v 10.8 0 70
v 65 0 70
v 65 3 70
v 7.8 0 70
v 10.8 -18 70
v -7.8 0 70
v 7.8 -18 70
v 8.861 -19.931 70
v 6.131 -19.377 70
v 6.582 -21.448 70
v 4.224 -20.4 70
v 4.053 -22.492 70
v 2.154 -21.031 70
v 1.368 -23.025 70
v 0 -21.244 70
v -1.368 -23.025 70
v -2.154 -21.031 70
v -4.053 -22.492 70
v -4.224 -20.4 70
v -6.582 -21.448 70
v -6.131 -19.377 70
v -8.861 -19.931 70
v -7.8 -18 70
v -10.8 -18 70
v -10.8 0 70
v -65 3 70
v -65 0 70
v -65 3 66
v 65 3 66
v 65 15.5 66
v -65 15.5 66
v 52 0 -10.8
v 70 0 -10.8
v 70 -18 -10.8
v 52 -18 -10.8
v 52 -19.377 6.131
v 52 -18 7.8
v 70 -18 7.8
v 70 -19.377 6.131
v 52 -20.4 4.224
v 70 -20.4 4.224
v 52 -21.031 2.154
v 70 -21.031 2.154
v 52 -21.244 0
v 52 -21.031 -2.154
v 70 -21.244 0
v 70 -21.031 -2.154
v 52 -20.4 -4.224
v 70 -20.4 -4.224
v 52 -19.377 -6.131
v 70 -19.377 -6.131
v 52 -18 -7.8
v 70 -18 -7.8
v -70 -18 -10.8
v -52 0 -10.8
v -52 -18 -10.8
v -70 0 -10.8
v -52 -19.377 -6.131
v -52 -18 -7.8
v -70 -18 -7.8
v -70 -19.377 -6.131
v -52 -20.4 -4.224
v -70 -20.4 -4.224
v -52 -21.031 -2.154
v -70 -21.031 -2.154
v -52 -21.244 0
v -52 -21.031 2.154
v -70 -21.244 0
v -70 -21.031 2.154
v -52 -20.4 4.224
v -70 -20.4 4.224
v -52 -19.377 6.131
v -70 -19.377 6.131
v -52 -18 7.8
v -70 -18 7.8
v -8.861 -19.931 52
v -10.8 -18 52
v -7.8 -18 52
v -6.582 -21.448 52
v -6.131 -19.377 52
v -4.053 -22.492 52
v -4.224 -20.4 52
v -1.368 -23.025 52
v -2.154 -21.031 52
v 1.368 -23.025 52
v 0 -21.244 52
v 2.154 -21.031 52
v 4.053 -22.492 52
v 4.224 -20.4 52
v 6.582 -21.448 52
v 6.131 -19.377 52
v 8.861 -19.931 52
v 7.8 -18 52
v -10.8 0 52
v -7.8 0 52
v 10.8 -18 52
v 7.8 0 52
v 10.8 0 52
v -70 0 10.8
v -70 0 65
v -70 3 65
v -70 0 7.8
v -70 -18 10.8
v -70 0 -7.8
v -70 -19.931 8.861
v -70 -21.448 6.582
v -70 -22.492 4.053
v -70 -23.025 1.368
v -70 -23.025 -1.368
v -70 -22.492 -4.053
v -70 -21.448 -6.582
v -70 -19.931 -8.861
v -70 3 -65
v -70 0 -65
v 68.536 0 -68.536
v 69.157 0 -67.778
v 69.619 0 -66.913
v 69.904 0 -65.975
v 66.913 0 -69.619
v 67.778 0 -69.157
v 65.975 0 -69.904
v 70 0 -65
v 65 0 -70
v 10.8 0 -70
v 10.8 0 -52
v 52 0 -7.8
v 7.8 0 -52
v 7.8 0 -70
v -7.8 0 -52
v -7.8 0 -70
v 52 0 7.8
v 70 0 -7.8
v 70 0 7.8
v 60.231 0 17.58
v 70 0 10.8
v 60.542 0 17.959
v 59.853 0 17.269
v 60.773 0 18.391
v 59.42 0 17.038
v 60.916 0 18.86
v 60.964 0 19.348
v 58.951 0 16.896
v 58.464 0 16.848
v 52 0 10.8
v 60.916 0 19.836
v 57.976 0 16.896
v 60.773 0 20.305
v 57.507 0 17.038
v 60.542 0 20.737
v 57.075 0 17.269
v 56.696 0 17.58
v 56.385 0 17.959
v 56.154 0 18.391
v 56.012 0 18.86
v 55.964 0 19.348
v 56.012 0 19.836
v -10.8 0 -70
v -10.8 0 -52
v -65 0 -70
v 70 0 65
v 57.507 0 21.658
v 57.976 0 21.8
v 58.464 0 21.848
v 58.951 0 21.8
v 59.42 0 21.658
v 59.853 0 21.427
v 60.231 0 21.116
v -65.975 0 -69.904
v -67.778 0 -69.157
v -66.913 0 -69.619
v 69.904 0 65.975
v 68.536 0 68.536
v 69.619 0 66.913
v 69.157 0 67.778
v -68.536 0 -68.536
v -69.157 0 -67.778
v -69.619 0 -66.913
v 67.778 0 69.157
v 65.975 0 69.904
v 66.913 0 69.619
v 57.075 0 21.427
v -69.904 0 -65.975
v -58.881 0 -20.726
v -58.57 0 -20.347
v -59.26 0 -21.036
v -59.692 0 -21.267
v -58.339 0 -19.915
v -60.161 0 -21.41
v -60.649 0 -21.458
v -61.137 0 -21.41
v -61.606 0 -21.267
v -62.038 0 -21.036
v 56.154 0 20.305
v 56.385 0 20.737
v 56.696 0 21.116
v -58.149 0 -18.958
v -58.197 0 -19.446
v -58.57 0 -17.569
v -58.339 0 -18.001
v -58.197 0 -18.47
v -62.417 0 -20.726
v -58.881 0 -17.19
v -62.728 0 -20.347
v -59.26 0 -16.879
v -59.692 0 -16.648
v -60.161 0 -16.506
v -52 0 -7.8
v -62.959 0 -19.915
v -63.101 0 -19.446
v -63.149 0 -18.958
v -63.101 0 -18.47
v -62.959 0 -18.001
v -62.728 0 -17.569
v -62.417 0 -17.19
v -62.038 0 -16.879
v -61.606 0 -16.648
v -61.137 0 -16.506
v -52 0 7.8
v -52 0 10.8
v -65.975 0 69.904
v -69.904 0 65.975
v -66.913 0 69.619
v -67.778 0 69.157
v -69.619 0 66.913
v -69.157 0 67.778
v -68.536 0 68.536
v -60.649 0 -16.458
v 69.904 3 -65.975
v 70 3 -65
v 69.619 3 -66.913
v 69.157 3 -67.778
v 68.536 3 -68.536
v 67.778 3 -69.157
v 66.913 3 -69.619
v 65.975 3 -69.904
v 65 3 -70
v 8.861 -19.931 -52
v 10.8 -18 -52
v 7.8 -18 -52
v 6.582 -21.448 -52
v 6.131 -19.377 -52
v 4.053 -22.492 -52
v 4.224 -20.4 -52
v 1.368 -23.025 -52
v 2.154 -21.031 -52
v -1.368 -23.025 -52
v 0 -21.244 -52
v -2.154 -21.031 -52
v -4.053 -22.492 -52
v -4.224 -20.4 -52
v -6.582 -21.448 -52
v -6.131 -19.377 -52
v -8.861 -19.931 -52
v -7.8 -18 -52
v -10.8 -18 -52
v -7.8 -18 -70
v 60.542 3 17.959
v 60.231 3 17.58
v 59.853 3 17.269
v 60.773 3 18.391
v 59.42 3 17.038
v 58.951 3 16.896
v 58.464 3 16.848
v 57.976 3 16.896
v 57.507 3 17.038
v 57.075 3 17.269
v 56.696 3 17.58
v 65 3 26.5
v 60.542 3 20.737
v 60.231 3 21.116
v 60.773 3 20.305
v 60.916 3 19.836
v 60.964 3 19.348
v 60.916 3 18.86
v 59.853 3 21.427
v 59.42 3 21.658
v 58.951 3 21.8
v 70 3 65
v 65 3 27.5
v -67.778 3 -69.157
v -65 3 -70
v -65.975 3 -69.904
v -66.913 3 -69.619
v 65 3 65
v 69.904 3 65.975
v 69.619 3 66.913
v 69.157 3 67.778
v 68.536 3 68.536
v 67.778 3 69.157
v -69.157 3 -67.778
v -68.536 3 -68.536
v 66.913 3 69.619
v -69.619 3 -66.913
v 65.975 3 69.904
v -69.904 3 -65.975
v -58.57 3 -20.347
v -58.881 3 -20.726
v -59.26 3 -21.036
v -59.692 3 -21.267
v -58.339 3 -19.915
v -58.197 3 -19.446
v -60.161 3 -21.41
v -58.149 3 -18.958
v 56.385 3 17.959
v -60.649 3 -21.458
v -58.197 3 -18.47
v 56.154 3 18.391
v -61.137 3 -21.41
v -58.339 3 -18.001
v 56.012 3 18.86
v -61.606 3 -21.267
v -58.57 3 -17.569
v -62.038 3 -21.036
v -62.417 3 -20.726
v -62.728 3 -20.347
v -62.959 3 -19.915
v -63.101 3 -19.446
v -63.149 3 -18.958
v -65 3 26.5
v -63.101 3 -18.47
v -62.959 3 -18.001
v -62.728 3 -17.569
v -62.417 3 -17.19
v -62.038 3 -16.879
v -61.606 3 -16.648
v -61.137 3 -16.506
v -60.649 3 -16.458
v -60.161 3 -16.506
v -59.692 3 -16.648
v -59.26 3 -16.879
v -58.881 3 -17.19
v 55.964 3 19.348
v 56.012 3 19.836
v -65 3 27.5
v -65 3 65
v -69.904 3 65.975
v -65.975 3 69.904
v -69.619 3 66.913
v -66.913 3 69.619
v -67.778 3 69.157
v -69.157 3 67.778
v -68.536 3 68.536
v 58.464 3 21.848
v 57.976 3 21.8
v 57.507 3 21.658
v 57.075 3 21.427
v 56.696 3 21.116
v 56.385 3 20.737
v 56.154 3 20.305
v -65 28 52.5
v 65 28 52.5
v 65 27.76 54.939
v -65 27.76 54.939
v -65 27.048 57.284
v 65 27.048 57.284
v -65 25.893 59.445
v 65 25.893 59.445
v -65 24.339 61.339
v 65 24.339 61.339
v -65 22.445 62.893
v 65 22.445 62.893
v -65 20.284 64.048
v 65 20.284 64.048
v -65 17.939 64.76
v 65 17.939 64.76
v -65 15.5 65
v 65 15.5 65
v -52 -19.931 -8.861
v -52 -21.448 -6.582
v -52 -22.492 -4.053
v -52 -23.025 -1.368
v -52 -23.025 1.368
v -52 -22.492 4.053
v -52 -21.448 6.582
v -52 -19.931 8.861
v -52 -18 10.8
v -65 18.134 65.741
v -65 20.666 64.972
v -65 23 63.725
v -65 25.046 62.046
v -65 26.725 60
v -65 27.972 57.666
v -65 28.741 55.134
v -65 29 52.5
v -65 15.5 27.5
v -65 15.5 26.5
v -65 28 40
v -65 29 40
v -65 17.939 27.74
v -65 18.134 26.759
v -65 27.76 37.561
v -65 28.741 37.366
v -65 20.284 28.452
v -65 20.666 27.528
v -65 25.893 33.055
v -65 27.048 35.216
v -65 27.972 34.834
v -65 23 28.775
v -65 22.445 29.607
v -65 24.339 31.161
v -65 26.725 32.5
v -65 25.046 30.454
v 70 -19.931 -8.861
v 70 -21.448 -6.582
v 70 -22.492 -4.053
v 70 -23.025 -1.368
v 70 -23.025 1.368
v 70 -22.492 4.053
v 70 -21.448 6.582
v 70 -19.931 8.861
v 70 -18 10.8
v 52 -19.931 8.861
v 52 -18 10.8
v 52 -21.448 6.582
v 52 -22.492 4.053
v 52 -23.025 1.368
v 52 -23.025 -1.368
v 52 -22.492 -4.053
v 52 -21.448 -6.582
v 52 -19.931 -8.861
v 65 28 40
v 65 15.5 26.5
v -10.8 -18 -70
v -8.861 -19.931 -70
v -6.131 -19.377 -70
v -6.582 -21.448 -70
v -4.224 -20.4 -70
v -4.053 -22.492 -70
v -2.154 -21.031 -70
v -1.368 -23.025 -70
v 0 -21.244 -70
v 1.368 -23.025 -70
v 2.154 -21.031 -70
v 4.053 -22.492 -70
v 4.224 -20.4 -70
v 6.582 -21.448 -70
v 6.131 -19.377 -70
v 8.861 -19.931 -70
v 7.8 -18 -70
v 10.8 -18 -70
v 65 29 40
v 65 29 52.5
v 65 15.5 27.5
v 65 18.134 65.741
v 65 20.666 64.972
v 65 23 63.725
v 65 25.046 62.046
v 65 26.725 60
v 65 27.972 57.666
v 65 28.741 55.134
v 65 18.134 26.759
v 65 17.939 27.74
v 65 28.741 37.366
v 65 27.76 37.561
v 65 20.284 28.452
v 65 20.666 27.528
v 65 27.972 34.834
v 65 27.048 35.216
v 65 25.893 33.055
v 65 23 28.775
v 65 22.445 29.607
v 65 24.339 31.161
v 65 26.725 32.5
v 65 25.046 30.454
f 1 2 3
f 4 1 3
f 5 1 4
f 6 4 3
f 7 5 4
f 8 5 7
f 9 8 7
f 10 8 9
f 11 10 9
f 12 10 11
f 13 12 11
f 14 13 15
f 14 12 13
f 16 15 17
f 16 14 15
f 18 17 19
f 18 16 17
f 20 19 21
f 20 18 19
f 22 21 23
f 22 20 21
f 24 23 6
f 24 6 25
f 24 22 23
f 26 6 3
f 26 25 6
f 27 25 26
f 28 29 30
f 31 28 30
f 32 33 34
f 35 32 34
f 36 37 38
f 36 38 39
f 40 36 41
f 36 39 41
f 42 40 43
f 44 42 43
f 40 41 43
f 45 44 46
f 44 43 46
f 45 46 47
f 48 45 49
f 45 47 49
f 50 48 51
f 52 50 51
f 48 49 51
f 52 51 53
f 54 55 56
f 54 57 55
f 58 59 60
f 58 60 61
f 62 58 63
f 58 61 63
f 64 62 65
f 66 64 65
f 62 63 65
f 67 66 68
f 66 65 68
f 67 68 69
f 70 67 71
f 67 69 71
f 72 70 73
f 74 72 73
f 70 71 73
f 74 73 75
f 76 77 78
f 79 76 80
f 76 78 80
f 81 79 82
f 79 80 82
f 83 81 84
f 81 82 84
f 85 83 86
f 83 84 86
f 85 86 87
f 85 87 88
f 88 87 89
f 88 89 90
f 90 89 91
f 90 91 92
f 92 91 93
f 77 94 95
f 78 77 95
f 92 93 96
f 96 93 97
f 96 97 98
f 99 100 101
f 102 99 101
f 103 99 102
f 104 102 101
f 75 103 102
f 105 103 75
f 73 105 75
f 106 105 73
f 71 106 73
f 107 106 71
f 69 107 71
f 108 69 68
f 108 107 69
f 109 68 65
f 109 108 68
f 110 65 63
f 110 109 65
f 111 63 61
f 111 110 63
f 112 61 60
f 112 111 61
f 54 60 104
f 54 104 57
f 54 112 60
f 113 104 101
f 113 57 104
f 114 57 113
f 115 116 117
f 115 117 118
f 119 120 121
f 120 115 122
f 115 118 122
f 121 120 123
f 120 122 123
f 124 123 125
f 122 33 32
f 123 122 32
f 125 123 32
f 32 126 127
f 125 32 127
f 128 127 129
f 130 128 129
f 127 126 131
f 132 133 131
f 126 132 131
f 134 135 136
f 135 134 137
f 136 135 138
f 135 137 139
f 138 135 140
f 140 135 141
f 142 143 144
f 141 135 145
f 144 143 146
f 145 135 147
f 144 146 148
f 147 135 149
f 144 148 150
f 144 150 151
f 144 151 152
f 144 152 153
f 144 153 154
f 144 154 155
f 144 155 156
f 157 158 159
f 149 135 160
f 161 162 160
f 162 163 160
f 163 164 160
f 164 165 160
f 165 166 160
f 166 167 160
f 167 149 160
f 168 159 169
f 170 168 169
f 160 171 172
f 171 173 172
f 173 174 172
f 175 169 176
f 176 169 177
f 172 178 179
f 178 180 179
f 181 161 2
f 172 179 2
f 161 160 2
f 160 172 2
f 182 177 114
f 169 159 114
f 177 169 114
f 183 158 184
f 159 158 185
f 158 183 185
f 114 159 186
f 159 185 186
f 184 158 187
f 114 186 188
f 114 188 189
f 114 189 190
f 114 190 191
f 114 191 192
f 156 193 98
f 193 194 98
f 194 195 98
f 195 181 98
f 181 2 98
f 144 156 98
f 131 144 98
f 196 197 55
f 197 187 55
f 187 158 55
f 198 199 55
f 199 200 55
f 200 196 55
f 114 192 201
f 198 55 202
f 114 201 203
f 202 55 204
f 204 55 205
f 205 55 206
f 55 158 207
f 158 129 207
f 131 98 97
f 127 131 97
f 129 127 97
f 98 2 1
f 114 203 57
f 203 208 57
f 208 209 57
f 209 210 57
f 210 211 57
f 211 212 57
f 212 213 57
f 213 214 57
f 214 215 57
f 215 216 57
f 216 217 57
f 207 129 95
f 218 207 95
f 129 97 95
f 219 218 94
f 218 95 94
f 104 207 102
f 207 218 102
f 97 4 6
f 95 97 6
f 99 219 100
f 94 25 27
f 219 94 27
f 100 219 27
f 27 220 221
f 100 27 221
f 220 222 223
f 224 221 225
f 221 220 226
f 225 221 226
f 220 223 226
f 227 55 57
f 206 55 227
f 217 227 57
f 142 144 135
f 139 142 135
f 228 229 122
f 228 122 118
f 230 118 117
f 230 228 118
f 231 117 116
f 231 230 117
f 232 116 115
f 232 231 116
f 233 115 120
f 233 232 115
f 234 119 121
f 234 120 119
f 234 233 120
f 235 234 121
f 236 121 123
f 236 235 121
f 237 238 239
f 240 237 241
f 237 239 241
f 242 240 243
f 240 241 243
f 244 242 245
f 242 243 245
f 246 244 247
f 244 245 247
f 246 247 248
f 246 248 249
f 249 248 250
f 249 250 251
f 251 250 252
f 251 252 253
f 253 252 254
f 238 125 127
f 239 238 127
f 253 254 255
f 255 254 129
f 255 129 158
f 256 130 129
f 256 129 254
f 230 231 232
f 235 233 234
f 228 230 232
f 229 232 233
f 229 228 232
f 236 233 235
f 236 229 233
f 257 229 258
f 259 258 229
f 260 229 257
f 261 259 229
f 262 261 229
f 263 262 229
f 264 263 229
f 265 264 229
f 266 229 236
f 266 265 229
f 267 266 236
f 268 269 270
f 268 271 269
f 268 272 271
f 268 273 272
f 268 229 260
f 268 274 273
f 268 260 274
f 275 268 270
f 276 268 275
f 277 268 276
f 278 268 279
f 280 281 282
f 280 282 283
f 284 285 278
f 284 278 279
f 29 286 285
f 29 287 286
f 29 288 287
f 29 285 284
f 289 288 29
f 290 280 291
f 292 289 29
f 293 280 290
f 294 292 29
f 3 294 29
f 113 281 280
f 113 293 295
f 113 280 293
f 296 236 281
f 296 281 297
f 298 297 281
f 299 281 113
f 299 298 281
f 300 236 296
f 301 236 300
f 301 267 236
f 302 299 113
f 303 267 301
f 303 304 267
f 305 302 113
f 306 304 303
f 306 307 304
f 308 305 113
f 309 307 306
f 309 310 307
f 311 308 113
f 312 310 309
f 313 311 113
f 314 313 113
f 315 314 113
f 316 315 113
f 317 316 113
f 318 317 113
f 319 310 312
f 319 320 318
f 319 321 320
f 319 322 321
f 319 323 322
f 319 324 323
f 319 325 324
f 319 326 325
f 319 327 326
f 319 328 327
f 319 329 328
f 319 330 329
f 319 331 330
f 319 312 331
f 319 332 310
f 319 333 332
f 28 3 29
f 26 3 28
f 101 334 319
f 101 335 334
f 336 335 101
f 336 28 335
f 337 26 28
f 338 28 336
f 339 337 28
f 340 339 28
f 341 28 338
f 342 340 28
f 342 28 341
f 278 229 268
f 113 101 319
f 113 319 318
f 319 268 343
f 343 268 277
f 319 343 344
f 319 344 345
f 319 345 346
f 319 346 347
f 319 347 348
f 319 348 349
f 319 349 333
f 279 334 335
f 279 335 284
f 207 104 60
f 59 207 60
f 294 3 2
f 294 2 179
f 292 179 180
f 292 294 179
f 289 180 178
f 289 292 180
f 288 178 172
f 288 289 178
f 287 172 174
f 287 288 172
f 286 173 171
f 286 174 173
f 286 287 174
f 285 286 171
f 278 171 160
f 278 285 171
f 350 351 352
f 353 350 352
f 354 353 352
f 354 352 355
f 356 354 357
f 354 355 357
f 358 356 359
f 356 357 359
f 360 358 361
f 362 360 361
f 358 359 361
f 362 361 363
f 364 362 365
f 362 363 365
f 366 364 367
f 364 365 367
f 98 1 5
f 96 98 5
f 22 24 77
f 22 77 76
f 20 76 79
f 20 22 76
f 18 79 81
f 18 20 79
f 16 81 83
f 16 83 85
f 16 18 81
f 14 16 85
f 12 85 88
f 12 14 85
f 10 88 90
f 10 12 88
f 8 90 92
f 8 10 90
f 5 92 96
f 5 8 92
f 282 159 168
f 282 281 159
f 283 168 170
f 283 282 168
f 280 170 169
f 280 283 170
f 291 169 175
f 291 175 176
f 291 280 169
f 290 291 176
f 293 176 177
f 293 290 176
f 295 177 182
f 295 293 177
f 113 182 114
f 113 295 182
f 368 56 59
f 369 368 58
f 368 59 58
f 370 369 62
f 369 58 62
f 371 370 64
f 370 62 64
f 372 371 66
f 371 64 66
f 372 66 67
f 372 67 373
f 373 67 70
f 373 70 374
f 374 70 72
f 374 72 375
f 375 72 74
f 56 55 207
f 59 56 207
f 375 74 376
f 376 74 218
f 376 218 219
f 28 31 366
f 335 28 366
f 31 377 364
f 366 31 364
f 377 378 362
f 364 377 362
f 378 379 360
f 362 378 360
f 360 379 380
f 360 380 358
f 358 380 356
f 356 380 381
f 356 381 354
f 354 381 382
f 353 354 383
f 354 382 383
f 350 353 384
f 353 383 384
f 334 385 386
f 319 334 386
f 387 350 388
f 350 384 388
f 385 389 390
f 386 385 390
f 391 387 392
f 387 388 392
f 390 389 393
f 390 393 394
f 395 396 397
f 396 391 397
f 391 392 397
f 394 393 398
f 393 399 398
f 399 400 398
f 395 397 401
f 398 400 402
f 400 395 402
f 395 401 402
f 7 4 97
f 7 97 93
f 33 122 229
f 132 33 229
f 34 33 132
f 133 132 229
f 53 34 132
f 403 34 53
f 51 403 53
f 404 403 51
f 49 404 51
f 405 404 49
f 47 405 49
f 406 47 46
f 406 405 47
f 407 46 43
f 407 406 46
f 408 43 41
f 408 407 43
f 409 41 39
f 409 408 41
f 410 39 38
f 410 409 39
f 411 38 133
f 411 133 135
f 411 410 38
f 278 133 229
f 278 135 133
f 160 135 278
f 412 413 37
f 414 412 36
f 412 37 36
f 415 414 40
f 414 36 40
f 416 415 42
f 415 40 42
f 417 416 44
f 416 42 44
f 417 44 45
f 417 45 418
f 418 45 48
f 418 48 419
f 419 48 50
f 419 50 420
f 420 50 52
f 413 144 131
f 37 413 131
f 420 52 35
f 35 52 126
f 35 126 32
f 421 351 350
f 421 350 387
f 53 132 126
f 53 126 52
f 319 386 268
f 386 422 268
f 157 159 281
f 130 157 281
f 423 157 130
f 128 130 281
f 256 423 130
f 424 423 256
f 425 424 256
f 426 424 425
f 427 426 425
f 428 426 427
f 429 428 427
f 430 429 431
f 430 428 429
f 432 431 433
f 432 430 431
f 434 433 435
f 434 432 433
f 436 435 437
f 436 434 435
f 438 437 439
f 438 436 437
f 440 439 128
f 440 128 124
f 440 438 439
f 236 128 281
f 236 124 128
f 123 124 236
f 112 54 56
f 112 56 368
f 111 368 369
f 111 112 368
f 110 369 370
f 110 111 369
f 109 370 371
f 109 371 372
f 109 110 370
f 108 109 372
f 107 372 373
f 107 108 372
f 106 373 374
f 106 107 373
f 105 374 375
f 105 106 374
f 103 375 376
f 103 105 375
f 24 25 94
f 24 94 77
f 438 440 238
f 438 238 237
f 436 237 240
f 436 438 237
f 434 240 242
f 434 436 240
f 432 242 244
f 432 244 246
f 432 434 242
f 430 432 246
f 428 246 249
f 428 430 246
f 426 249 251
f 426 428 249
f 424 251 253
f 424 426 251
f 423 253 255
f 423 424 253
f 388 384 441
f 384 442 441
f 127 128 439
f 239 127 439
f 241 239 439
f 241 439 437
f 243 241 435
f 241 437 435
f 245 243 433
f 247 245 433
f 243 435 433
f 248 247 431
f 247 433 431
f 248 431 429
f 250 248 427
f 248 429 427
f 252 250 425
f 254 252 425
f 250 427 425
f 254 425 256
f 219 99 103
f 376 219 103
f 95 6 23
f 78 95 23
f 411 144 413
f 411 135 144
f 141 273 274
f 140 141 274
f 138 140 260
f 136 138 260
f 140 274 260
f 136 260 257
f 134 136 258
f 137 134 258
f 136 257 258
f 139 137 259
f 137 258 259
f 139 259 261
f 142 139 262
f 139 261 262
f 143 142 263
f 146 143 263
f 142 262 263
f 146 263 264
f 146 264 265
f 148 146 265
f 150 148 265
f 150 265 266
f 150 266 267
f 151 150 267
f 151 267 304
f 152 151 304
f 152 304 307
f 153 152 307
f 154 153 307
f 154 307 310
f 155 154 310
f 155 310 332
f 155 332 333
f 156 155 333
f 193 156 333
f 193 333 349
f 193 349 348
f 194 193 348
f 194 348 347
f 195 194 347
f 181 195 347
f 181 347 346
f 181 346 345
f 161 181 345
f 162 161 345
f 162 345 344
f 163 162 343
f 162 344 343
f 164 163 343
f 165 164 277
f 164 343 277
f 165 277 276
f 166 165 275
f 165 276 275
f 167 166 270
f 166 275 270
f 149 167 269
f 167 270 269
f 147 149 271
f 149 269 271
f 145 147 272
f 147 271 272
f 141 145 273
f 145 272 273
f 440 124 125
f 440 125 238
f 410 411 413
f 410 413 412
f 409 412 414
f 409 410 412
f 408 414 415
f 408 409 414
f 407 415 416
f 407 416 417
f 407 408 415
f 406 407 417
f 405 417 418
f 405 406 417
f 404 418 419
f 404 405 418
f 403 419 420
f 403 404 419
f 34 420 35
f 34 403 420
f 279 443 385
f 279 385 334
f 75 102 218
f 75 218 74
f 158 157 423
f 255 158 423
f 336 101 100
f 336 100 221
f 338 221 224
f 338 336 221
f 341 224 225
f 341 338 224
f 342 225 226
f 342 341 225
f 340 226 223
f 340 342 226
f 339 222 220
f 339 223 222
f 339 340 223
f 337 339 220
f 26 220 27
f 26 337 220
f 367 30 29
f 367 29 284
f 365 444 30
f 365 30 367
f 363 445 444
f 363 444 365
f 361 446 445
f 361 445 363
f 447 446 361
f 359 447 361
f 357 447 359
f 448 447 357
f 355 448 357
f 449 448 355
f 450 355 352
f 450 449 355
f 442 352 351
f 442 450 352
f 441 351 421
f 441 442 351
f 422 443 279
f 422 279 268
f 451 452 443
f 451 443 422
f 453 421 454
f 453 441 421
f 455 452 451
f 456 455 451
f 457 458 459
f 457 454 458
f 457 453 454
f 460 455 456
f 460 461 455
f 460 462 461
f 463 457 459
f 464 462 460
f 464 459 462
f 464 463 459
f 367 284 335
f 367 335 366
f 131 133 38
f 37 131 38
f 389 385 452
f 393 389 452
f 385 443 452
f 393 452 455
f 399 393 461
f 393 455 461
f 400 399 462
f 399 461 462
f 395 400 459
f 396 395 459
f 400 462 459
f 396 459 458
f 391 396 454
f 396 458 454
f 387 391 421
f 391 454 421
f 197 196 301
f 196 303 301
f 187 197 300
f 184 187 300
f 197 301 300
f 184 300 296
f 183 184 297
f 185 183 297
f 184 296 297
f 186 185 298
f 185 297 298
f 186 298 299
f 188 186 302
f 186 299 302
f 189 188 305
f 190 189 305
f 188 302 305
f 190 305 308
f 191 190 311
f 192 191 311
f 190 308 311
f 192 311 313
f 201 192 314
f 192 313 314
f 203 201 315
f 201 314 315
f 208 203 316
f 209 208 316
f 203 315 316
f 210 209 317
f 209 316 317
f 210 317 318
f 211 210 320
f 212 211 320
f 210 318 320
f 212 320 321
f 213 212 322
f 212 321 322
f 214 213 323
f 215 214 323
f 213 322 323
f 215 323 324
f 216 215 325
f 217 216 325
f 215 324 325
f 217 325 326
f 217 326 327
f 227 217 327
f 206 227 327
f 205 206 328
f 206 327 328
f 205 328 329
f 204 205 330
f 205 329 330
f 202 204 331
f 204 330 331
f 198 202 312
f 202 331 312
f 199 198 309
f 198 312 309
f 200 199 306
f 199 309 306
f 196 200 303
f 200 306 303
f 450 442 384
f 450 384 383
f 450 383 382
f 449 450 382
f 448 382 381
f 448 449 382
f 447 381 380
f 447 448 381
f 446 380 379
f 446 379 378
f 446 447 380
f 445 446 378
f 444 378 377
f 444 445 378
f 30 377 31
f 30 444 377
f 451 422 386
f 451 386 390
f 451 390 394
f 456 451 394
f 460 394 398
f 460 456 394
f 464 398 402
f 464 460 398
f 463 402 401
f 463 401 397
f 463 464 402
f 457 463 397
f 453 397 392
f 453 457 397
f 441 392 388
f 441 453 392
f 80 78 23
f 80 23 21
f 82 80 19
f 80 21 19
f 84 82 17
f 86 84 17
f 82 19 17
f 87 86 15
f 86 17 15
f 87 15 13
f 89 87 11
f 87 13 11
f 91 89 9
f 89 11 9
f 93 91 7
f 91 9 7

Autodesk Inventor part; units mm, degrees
ref_plane "YZ Plane" through (0, 0, 0) normal (1, 0, 0) x (0, 1, 0)
ref_plane "XZ Plane" through (0, 0, 0) normal (0, 1, 0) x (-1, 0, 0)
sketch "Sketch1" plane through (0, 0, 0) normal (0, 1, 0) x (-1, 0, 0)
  line L0 (70, 0) -> (70, -70)
  line L1 (70, -70) -> (0, -70)
  line L2 (-70, 0) -> (-70, 70)
  line L3 (-70, 70) -> (0, 70)
  line L4 (0, 70) -> (70, 70)
  line L5 (70, 70) -> (70, 0)
  line L6 (0, -70) -> (-70, -70)
  line L7 (-70, -70) -> (-70, 0)
  point P0 (0, 0)
extrude "Extrusion1" add sketch "Sketch1" along normal blind 3
fillet "Fillet1" radius 5 3 edges at (70, 1.5, 70) (70, 1.5, -70) (-70, 1.5, 70)
fillet "Fillet2" radius 5 1 edges at (-70, 1.5, -70)
ref_plane "Work Plane1" through (65, 0, 65) normal (1, 0, 0) x (0, 0, -1)
sketch "Sketch5" plane through (65, 0, 65) normal (1, 0, 0) x (0, 0, -1)
  line L0 (0, 3) -> (0, 15.5)
  arc A0 (12.5, 28) -> (0, 15.5) centre (12.5, 15.5) ccw
  line L1 (12.5, 28) -> (25, 28)
  arc A1 (37.5, 15.5) -> (25, 28) centre (25, 15.5) ccw
  line L2 (37.5, 15.5) -> (37.5, 3)
  line L3 (0, 3) -> (130, 3) projected
  line L4 (0, 3) -> (-1, 3)
  line L5 (-5, 3) -> (0, 3) projected
  line L6 (-1, 3) -> (-1, 15.5)
  arc A2 (12.5, 29) -> (-1, 15.5) centre (12.5, 15.5) ccw
  line L7 (12.5, 29) -> (25, 29)
  arc A3 (38.5, 15.5) -> (25, 29) centre (25, 15.5) ccw
  line L8 (38.5, 15.5) -> (38.5, 3)
  line L9 (38.5, 3) -> (37.5, 3)
  line L10 (0, 3) -> (-1, 3)
  line L11 (0, 0) -> (0, 3) projected
  point P0 (65, 0)
  dimension "d9" = 12.5
  dimension "d11" = 12.5
  dimension "d12" = 1
extrude "Extrusion2" add sketch "Sketch5" against normal blind 130 contours L4 L6 A2 L7 A3 L8 L3 L2 A1 L1 A0 L0
sketch "Sketch6" plane through (70, 0, 65) normal (1, 0, 0) x (0, 0, -1)
  line L0 (65, 0) -> (57.2, 0)
  line L1 (130, 0) -> (0, 0) projected
  line L2 (65, 0) -> (72.8, 0)
  line L3 (57.2, 0) -> (57.2, -18)
  line L4 (72.8, 0) -> (72.8, -18)
  line L5 (65, 0) -> (65, -10)
  arc A0 (57.2, -18) -> (72.8, -18) centre (65, -10.2437) ccw
  line L6 (57.2, 0) -> (54.2, 0)
  line L7 (54.2, 0) -> (54.2, -18)
  line L8 (72.8, 0) -> (75.8, 0)
  line L9 (75.8, 0) -> (75.8, -18)
  arc A1 (54.2, -18) -> (75.8, -18) centre (65, -9.0916) ccw
  dimension "d17" = 18
  dimension "d21" = 3
  dimension "d22" = 3
extrude "Extrusion3" add sketch "Sketch6" against normal blind 18 contours L3 A0 L4 L1 L9 A1 L7
pattern_circular "Circular Pattern1" count 4 over 360 about axis through (0, -10, 0) along (0, 1, 0) of "Extrusion3"
sketch "Sketch8" plane through (0, 3, 0) normal (0, 1, 0) x (1, 0, 0)
  circle A0 centre (58.4636, -19.348) radius 2.5
  point P0 (0, 0)
  dimension "d35" = 5
extrude "Extrusion5" cut sketch "Sketch8" against normal blind 3
sketch "Sketch9" plane through (0, 3, 0) normal (0, 1, 0) x (1, 0, 0)
  circle A0 centre (-60.6489, 18.9578) radius 2.5
  point P0 (0, 0)
  dimension "d39" = 5
extrude "Extrusion6" cut sketch "Sketch9" against normal blind 3
properties part number "smallpart"
